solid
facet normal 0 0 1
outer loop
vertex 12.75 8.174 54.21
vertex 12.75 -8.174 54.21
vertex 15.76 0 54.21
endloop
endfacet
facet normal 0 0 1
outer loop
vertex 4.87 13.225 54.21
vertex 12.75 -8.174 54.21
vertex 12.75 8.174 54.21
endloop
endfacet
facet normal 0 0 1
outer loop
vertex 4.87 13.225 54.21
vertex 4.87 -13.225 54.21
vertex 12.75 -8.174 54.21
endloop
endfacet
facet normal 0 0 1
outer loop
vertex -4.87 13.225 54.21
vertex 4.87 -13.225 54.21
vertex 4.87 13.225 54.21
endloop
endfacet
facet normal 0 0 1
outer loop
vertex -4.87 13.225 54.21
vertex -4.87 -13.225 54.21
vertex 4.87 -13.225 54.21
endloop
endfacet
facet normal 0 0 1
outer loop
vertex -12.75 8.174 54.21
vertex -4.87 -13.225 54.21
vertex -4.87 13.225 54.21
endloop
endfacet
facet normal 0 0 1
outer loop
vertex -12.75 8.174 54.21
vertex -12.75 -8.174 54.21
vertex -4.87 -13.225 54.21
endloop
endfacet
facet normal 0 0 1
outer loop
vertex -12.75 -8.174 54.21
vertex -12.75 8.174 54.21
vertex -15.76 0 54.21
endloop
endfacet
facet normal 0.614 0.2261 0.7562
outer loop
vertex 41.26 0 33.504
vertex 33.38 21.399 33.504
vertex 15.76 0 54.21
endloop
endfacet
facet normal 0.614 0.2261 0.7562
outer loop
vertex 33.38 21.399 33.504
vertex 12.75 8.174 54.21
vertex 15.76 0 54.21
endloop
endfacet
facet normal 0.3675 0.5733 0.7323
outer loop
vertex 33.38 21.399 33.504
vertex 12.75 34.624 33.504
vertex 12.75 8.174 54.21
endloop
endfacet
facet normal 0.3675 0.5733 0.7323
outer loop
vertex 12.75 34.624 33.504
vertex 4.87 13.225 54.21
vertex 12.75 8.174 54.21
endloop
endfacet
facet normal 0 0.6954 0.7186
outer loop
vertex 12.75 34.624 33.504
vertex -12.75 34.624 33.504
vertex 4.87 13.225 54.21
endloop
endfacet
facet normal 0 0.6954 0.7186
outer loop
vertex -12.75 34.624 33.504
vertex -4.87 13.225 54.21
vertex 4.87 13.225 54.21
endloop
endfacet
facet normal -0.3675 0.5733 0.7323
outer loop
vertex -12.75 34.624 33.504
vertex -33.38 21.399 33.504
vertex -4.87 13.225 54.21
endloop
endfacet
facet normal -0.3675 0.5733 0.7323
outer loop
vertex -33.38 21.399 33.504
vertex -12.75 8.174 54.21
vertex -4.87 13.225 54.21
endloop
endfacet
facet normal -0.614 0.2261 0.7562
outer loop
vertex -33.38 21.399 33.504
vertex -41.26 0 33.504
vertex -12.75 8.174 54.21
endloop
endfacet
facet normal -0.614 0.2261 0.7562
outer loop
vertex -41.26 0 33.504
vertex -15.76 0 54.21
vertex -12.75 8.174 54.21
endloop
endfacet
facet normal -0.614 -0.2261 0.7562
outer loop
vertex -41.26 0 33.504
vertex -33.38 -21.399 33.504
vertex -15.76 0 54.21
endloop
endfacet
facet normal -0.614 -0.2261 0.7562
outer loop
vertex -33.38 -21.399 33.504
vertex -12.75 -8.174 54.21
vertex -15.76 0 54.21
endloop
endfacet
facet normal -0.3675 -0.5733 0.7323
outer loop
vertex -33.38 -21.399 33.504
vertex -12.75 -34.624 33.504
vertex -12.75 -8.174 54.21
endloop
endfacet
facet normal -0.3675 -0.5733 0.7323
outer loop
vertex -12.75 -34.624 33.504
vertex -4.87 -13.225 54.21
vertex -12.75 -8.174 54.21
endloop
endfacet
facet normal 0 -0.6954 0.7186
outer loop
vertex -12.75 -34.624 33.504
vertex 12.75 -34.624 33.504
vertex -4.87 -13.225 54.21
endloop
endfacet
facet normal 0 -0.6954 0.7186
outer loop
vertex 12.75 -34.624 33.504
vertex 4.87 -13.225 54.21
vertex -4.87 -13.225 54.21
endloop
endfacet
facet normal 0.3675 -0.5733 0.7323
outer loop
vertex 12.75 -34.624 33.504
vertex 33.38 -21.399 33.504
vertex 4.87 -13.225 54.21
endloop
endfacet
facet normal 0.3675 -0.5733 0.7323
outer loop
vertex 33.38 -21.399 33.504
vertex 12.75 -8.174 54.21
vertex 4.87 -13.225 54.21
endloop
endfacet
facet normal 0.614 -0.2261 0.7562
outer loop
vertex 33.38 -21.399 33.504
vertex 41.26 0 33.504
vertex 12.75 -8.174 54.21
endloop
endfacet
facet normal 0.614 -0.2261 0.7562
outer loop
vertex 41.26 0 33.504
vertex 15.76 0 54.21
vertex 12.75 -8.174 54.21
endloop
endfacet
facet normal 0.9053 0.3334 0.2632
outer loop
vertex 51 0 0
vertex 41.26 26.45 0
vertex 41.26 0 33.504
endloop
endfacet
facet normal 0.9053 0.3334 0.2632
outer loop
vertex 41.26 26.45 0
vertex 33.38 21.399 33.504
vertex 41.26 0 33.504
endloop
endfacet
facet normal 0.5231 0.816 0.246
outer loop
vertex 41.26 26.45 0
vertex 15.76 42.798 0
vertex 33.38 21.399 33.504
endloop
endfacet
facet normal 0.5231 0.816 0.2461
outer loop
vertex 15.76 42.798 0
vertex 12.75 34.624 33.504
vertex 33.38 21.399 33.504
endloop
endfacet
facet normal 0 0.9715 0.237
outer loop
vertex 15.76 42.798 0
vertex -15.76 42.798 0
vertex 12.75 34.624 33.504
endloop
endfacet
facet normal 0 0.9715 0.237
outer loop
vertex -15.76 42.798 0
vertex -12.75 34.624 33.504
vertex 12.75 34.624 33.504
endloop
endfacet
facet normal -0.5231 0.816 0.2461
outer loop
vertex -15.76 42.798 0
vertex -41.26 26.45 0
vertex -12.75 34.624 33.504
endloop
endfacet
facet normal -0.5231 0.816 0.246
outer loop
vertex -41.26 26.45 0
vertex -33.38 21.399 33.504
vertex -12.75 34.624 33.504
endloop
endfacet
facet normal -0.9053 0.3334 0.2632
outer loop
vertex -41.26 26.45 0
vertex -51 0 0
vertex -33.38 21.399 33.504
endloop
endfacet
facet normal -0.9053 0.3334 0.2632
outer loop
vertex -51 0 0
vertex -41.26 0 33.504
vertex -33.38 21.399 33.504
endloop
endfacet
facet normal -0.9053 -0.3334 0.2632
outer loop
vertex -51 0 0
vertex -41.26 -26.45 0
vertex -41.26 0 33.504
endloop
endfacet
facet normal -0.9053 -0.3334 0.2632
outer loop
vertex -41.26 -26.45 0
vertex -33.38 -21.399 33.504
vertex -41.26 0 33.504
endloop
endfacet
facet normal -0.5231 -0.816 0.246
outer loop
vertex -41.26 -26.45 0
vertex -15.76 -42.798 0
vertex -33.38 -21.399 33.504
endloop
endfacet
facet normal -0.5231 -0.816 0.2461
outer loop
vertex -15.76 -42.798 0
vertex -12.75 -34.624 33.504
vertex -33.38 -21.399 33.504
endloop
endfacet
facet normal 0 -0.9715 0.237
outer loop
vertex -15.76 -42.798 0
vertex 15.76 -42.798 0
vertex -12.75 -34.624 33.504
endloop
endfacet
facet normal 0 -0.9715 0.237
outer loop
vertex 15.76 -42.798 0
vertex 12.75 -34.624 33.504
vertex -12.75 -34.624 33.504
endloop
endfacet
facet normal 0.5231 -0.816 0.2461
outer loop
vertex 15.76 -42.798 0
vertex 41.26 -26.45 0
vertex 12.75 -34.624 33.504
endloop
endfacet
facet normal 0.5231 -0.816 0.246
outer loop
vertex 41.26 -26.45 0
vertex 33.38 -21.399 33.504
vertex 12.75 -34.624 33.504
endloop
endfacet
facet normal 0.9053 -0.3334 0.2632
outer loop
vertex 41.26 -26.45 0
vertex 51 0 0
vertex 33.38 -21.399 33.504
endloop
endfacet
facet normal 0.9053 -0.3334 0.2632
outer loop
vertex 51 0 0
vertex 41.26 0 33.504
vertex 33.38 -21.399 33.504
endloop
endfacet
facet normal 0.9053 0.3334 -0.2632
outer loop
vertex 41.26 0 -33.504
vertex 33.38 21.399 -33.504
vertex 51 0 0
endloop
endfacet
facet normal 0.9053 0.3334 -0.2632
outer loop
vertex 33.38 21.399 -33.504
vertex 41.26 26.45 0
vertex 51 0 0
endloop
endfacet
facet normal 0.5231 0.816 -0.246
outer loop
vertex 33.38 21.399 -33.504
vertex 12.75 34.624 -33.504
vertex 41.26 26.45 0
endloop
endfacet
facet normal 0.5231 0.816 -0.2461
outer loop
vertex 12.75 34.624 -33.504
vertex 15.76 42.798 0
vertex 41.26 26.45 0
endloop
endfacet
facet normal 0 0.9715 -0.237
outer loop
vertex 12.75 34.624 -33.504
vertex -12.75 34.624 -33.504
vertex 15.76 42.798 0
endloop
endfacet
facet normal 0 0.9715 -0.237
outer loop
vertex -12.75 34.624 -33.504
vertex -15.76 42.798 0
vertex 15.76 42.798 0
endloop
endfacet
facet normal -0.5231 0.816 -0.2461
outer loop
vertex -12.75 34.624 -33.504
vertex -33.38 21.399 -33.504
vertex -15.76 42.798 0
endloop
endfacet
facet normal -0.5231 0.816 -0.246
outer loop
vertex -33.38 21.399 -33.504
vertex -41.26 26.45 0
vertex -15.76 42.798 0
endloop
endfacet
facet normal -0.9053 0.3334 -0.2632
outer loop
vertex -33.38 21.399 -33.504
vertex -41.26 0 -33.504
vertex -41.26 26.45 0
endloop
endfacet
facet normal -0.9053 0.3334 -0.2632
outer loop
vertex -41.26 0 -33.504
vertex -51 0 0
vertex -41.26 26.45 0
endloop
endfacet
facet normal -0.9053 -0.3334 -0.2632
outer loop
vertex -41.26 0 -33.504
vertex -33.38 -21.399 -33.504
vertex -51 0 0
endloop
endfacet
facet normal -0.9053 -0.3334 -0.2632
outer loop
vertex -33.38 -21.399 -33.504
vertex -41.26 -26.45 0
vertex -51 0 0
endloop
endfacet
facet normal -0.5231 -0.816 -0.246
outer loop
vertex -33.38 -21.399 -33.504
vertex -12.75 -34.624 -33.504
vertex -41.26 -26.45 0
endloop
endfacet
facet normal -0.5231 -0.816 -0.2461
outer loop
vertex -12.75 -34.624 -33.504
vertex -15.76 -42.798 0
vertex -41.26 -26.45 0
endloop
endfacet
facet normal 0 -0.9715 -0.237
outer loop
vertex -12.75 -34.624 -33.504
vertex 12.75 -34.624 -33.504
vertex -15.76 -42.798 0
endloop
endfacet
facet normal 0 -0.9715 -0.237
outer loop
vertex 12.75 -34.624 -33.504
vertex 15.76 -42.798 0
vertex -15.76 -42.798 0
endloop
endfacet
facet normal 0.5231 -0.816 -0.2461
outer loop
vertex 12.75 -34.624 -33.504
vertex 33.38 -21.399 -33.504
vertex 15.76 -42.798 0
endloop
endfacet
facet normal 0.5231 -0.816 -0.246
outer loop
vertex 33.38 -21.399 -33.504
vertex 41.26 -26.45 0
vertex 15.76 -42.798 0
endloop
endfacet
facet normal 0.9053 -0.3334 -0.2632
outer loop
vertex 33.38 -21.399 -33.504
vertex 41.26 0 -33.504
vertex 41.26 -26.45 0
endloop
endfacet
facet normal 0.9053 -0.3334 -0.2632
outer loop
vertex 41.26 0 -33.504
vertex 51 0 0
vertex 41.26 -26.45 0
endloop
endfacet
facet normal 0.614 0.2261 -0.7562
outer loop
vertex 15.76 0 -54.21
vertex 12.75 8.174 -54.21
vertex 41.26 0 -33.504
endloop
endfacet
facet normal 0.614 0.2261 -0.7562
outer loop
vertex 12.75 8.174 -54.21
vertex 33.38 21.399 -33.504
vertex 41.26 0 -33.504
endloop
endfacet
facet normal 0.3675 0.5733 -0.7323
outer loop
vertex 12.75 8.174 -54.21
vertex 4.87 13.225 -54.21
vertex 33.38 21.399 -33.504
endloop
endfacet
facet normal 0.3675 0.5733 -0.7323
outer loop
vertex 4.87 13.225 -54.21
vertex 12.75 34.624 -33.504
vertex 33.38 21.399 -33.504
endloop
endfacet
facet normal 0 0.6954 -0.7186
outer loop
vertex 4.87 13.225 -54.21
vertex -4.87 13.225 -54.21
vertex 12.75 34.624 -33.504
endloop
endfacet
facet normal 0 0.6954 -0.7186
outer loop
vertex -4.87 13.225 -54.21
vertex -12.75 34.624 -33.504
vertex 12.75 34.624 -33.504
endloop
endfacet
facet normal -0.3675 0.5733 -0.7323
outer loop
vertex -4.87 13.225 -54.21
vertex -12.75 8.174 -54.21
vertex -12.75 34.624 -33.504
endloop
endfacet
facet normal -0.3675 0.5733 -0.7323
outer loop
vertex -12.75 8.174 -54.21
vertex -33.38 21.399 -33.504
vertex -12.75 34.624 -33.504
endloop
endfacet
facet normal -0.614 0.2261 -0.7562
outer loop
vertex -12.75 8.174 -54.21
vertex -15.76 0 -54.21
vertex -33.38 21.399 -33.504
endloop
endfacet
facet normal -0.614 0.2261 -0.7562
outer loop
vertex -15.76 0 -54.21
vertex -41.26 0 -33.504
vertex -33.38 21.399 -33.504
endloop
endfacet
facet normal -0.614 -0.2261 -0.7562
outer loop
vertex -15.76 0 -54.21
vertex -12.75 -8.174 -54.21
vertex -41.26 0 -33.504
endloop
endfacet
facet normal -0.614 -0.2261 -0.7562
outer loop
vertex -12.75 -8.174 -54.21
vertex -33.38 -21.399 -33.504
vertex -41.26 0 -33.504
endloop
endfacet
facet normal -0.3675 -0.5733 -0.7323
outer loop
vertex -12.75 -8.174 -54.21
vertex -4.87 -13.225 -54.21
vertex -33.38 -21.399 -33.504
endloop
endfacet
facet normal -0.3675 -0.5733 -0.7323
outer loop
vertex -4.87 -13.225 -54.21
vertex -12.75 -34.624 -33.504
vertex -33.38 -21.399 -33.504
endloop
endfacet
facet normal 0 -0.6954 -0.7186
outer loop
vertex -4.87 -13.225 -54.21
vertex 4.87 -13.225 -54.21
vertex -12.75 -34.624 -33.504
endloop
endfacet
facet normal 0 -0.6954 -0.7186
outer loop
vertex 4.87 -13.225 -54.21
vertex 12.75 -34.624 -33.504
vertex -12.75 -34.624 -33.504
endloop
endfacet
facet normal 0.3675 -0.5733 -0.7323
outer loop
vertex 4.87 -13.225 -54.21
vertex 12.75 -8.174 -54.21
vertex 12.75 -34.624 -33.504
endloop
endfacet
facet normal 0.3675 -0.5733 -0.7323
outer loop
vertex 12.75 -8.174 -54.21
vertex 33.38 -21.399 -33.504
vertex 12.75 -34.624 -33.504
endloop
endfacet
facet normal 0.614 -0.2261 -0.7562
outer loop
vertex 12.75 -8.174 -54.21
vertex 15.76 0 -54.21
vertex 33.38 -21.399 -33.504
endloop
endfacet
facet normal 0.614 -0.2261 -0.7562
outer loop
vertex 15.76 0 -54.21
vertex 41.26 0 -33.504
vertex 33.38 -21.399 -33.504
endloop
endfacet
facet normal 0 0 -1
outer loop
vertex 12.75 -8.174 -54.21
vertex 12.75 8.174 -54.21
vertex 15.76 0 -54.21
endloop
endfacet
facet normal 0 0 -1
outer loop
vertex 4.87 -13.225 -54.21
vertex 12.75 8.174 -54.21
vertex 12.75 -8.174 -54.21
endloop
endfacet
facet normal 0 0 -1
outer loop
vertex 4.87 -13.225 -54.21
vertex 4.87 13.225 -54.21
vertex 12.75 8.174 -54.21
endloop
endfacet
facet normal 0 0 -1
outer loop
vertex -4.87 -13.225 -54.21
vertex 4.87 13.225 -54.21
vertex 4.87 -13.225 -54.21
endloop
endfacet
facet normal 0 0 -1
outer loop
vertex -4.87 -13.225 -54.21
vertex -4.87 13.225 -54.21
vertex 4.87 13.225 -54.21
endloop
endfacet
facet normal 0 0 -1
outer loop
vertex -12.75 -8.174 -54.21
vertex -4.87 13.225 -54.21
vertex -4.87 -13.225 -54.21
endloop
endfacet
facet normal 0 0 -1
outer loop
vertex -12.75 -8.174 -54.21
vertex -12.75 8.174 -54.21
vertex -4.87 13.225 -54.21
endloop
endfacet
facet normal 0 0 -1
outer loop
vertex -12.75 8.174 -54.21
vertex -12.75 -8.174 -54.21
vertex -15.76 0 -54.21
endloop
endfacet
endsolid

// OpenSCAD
// Generated by SolidPython 1.0.1 on 2020-07-29 00:46:53


scale(v = [17, 15, 19]) {
	sphere(r = 3);
}
/***********************************************
*********      SolidPython code:      **********
************************************************
 
# import packages: SolidPython
from solid import *
from solid.utils import *
from itertools import chain, combinations, permutations


class Resize:

    def __init__(self, scad_file):
        self.scad_file = scad_file
        #self.scad_file = import_scad(scad_file)
        # cone/cylinder param:
        self.r1 = 0
        self.r2 = 0
        self.h = 0
        # rectangular prism param:
        self.w = 0
        self.l = 0
        # ellipse param:
        self.r = 0

    # import OpenScad code (file name corresponds to shape)


    # classify shape + parameters
    def assign(self, param1, param2, param3):
        if self.scad_file == 'cone.scad':
            self.r1 = param1
            self.r2 = param2
            self.h = param3
        elif self.scad_file == 'cylinder.scad':
            self.r1 = param1
            self.r2 = param2
            self.h = param3
        elif self.scad_file == 'rectangularPrism.scad':
            self.h = param1
            self.l = param2
            self.w = param3
        else:
            self.r = param1
            self.h = param2

    # resize parameters
    def iterate(self):
        x = range(3, 20, 2)
        i = 1
        if self.scad_file == 'cone.scad':
            tempList = list(permutations(x, 2))
            for temp in tempList:
                param1 = temp[0]
                param2 = temp[1]
                filepath = 'produced_scad_files/' + 'cone' + str(param1) + '_' + str(param2) + '_' + '.scad'
                scad_render_to_file(cylinder(h=param1, r1=param2, r2=0), filepath)

        elif self.scad_file == 'cylinder.scad':
            tempList = list(permutations(x, 3))
            for temp in tempList:
                param1 = temp[0]
                param2 = temp[1]
                filepath = 'produced_scad_files/' + 'cylinder' + str(param1) + '_' + str(param2) + '_' + '.scad'
                scad_render_to_file(cylinder(h=param1, r1=param2, r2=param2), filepath)

        elif self.scad_file == 'rectangularPrism.scad':
            tempList = list(permutations(x, 3))
            for temp in tempList:
                param1 = temp[0]
                param2 = temp[1]
                param3 = temp[2]
                filepath = 'produced_scad_files/' + 'rectangularPrism' + str(param1) + '_' + str(param2) + '_' + str(
                    param3) + '.scad'
                scad_render_to_file(cube(size=(param1, param2, param3)), filepath)

        elif self.scad_file == 'ellipse.scad':
            tempList = list(permutations(x, 4))
            for temp in tempList:
                param1 = temp[0]
                param2 = temp[1]
                param3 = temp[2]
                param4 = temp[3]
                filepath = 'produced_scad_files/' + 'ellipse' + str(param1) + '_' + str(param2) + '_' + str(param3) + '_' + str(param4) + '.scad'
                scad_render_to_file(scale([param1, param2, param3])(sphere(r=param4)), filepath)

    def render_to_scadfile(self):
        scad_render_to_file(scad, 'example.scad') 
 
************************************************/
